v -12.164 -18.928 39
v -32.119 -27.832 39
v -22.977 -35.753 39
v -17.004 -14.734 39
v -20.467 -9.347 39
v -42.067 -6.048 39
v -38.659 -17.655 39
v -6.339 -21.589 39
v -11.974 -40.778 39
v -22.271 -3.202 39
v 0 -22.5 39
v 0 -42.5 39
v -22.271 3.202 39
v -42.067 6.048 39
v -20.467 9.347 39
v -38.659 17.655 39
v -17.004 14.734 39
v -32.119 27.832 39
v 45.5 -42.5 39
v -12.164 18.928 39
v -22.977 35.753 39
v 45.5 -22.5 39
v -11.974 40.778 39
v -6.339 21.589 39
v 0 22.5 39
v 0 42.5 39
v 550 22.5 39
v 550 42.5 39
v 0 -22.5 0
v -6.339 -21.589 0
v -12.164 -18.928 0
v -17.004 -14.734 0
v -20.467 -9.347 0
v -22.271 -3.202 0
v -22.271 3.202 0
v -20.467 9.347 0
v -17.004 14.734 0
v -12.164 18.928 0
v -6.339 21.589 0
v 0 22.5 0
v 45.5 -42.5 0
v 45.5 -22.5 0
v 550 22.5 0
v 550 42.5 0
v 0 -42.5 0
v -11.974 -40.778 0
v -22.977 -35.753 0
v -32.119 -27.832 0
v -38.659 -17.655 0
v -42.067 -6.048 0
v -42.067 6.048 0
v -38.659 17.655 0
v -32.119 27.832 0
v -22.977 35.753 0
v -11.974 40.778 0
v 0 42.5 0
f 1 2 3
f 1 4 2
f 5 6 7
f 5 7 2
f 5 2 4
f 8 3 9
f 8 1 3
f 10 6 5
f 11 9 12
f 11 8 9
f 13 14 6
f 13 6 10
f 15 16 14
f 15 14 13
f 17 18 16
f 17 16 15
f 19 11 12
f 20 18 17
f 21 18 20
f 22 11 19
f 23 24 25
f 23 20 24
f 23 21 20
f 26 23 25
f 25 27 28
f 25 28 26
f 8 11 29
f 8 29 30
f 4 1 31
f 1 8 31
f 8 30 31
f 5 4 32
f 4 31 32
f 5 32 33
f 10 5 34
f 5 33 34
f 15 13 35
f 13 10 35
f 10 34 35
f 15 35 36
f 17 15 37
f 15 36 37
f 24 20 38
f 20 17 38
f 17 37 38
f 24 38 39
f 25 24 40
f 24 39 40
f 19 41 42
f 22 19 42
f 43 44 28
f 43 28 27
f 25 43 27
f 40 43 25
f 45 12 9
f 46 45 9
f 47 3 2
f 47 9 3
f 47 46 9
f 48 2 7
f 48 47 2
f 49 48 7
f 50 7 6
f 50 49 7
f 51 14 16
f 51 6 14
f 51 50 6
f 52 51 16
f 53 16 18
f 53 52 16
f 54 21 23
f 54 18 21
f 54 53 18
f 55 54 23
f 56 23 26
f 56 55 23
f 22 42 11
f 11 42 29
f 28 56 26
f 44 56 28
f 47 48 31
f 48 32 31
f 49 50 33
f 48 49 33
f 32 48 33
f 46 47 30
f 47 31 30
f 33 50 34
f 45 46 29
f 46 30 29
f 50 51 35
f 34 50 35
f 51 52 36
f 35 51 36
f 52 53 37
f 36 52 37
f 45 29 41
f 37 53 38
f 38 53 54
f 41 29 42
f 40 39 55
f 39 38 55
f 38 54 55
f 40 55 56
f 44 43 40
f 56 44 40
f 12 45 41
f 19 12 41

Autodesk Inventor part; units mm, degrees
ref_plane "YZ Plane" through (0, 0, 0) normal (1, 0, 0) x (0, 1, 0)
ref_plane "XZ Plane" through (0, 0, 0) normal (0, 1, 0) x (-1, 0, 0)
ref_plane "XY Plane" through (0, 0, 0) normal (0, 0, 1) x (1, 0, 0)
sketch "Sketch1" plane through (0, 0, 0) normal (0, 0, 1) x (1, 0, 0)
  circle A0 centre (0, 0) radius 42.5
  line L0 (0, -42.5) -> (45.5, -42.5)
  line L1 (45.5, -42.5) -> (45.5, -22.5)
  line L2 (45.5, -22.5) -> (0, -22.5)
  line L3 (0, -22.5) -> (0, -42.5)
  line L4 (0, 42.5) -> (550, 42.5)
  line L5 (550, 42.5) -> (550, 22.5)
  line L6 (550, 22.5) -> (0, 22.5)
  line L7 (0, 22.5) -> (0, 42.5)
  circle A1 centre (0, 0) radius 22.5
  point P0 (0, -22.5)
  point P1 (0, 22.5)
  point P2 (15.5, -22.5)
  point P3 (-42.5, 0)
  dimension "d0" = 85
  dimension "d1" = 20
  dimension "d2" = 20
  dimension "d9" = 550
  dimension "d10" = 58
  dimension "d11" = 30
extrude "Extrusion1" add sketch "Sketch1" along normal blind 39 contours L7 A1 L3 A0 | L4 L5 L6 A0 | A0 L6 L7 | L3 L2 A0 | A0 L2 L1 L0
properties part number "J15BF.1.30_Zaxis"
